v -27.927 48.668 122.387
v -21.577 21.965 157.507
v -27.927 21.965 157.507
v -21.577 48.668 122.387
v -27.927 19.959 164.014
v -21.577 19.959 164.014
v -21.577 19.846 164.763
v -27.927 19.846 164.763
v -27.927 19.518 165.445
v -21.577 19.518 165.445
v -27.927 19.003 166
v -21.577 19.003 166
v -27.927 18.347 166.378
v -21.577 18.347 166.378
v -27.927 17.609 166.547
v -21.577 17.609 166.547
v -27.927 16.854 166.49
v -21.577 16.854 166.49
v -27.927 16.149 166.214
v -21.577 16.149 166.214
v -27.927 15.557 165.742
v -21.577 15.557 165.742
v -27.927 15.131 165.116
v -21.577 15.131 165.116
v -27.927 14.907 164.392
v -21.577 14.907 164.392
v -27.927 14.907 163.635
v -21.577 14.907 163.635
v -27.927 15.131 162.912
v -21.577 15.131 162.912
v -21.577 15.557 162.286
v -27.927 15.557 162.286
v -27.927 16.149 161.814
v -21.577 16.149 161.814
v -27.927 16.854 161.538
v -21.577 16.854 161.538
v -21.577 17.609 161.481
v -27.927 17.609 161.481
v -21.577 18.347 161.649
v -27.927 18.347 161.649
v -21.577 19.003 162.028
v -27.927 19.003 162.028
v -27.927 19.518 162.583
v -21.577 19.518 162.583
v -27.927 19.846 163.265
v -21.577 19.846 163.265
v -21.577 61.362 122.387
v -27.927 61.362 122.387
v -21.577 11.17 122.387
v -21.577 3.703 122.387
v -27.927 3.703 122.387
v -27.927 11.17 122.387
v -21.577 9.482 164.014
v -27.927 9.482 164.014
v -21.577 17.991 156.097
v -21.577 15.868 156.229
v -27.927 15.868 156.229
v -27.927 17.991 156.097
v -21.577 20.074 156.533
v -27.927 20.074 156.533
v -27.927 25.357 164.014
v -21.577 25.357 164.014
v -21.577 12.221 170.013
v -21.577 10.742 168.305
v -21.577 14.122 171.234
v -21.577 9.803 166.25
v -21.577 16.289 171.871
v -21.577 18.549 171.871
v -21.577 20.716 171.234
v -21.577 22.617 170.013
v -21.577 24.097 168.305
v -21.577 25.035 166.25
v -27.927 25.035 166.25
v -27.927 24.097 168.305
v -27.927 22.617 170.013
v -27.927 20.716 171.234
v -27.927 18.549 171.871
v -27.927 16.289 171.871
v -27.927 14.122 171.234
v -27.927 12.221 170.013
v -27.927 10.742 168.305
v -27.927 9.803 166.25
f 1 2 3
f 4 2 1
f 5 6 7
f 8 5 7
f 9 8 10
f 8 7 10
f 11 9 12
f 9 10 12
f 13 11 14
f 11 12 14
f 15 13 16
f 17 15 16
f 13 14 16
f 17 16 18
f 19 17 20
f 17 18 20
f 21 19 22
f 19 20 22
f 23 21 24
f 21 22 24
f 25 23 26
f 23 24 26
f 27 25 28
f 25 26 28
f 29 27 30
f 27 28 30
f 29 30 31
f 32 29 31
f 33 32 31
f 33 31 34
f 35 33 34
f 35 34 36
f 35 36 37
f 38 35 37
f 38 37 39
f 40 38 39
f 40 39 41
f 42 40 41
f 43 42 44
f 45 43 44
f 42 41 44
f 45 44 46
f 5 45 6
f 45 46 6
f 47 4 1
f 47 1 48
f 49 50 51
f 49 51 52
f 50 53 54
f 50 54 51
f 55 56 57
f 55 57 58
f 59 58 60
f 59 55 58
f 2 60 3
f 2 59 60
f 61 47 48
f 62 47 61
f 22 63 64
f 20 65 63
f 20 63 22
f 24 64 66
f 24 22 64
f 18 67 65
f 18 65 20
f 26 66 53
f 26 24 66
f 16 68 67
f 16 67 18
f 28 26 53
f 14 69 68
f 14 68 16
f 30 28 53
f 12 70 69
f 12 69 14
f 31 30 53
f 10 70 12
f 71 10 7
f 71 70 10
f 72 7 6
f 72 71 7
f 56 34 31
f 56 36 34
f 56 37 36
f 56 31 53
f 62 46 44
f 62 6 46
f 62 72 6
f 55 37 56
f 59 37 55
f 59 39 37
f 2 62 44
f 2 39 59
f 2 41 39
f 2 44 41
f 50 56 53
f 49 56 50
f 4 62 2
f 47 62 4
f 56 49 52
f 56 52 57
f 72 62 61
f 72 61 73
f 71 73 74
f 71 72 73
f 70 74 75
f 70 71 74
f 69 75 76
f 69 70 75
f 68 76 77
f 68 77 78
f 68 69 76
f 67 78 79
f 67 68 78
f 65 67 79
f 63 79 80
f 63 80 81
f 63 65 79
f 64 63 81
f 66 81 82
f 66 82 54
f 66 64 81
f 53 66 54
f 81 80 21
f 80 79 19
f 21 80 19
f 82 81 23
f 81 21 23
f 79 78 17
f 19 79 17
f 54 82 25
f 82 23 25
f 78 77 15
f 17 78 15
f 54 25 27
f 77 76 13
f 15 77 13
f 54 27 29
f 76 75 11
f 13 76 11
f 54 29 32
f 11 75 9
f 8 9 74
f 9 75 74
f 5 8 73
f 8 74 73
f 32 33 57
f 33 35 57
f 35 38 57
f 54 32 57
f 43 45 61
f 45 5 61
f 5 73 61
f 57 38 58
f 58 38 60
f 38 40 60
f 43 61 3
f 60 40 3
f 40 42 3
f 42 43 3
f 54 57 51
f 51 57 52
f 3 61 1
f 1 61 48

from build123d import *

# Parameters (mm, degrees)
SKETCH1_R           = 2.54
BOSS_EXTRUDE1_DEPTH = 6.35


with BuildPart() as part:
    # Sketch1 → Boss-Extrude1 (new body)
    with BuildSketch(Plane(origin=(-21.577168497, 0, 0), x_dir=(0, 0, -1), z_dir=(1, 0, 0))):
        with BuildLine():
            Line((-122.387241806, 61.361669294), (-164.013892996, 25.356612642))
            ThreePointArc((-164.013892996, 25.356612642), (-171.951392996, 17.419112642), (-164.013892996, 9.481612642))
            Line((-164.013892996, 9.481612642), (-122.387241806, 3.703044496))
            Line((-122.387241806, 3.703044496), (-122.387241806, 11.169831477))
            Line((-122.387241806, 11.169831477), (-156.229469136, 15.867774051))
            ThreePointArc((-156.229469136, 15.867774051), (-156.245156978, 19.047193392), (-157.50733564, 21.965387779))
            Line((-157.50733564, 21.965387779), (-122.387241806, 48.668462371))
            Line((-122.387241806, 48.668462371), (-122.387241806, 61.361669294))
        make_face()
        with Locations(Location((-164.013892996, 17.419112642, 0), (0, 0, 90))):
            Circle(SKETCH1_R, mode=Mode.SUBTRACT)
    extrude(amount=-BOSS_EXTRUDE1_DEPTH)


solid = part.part
